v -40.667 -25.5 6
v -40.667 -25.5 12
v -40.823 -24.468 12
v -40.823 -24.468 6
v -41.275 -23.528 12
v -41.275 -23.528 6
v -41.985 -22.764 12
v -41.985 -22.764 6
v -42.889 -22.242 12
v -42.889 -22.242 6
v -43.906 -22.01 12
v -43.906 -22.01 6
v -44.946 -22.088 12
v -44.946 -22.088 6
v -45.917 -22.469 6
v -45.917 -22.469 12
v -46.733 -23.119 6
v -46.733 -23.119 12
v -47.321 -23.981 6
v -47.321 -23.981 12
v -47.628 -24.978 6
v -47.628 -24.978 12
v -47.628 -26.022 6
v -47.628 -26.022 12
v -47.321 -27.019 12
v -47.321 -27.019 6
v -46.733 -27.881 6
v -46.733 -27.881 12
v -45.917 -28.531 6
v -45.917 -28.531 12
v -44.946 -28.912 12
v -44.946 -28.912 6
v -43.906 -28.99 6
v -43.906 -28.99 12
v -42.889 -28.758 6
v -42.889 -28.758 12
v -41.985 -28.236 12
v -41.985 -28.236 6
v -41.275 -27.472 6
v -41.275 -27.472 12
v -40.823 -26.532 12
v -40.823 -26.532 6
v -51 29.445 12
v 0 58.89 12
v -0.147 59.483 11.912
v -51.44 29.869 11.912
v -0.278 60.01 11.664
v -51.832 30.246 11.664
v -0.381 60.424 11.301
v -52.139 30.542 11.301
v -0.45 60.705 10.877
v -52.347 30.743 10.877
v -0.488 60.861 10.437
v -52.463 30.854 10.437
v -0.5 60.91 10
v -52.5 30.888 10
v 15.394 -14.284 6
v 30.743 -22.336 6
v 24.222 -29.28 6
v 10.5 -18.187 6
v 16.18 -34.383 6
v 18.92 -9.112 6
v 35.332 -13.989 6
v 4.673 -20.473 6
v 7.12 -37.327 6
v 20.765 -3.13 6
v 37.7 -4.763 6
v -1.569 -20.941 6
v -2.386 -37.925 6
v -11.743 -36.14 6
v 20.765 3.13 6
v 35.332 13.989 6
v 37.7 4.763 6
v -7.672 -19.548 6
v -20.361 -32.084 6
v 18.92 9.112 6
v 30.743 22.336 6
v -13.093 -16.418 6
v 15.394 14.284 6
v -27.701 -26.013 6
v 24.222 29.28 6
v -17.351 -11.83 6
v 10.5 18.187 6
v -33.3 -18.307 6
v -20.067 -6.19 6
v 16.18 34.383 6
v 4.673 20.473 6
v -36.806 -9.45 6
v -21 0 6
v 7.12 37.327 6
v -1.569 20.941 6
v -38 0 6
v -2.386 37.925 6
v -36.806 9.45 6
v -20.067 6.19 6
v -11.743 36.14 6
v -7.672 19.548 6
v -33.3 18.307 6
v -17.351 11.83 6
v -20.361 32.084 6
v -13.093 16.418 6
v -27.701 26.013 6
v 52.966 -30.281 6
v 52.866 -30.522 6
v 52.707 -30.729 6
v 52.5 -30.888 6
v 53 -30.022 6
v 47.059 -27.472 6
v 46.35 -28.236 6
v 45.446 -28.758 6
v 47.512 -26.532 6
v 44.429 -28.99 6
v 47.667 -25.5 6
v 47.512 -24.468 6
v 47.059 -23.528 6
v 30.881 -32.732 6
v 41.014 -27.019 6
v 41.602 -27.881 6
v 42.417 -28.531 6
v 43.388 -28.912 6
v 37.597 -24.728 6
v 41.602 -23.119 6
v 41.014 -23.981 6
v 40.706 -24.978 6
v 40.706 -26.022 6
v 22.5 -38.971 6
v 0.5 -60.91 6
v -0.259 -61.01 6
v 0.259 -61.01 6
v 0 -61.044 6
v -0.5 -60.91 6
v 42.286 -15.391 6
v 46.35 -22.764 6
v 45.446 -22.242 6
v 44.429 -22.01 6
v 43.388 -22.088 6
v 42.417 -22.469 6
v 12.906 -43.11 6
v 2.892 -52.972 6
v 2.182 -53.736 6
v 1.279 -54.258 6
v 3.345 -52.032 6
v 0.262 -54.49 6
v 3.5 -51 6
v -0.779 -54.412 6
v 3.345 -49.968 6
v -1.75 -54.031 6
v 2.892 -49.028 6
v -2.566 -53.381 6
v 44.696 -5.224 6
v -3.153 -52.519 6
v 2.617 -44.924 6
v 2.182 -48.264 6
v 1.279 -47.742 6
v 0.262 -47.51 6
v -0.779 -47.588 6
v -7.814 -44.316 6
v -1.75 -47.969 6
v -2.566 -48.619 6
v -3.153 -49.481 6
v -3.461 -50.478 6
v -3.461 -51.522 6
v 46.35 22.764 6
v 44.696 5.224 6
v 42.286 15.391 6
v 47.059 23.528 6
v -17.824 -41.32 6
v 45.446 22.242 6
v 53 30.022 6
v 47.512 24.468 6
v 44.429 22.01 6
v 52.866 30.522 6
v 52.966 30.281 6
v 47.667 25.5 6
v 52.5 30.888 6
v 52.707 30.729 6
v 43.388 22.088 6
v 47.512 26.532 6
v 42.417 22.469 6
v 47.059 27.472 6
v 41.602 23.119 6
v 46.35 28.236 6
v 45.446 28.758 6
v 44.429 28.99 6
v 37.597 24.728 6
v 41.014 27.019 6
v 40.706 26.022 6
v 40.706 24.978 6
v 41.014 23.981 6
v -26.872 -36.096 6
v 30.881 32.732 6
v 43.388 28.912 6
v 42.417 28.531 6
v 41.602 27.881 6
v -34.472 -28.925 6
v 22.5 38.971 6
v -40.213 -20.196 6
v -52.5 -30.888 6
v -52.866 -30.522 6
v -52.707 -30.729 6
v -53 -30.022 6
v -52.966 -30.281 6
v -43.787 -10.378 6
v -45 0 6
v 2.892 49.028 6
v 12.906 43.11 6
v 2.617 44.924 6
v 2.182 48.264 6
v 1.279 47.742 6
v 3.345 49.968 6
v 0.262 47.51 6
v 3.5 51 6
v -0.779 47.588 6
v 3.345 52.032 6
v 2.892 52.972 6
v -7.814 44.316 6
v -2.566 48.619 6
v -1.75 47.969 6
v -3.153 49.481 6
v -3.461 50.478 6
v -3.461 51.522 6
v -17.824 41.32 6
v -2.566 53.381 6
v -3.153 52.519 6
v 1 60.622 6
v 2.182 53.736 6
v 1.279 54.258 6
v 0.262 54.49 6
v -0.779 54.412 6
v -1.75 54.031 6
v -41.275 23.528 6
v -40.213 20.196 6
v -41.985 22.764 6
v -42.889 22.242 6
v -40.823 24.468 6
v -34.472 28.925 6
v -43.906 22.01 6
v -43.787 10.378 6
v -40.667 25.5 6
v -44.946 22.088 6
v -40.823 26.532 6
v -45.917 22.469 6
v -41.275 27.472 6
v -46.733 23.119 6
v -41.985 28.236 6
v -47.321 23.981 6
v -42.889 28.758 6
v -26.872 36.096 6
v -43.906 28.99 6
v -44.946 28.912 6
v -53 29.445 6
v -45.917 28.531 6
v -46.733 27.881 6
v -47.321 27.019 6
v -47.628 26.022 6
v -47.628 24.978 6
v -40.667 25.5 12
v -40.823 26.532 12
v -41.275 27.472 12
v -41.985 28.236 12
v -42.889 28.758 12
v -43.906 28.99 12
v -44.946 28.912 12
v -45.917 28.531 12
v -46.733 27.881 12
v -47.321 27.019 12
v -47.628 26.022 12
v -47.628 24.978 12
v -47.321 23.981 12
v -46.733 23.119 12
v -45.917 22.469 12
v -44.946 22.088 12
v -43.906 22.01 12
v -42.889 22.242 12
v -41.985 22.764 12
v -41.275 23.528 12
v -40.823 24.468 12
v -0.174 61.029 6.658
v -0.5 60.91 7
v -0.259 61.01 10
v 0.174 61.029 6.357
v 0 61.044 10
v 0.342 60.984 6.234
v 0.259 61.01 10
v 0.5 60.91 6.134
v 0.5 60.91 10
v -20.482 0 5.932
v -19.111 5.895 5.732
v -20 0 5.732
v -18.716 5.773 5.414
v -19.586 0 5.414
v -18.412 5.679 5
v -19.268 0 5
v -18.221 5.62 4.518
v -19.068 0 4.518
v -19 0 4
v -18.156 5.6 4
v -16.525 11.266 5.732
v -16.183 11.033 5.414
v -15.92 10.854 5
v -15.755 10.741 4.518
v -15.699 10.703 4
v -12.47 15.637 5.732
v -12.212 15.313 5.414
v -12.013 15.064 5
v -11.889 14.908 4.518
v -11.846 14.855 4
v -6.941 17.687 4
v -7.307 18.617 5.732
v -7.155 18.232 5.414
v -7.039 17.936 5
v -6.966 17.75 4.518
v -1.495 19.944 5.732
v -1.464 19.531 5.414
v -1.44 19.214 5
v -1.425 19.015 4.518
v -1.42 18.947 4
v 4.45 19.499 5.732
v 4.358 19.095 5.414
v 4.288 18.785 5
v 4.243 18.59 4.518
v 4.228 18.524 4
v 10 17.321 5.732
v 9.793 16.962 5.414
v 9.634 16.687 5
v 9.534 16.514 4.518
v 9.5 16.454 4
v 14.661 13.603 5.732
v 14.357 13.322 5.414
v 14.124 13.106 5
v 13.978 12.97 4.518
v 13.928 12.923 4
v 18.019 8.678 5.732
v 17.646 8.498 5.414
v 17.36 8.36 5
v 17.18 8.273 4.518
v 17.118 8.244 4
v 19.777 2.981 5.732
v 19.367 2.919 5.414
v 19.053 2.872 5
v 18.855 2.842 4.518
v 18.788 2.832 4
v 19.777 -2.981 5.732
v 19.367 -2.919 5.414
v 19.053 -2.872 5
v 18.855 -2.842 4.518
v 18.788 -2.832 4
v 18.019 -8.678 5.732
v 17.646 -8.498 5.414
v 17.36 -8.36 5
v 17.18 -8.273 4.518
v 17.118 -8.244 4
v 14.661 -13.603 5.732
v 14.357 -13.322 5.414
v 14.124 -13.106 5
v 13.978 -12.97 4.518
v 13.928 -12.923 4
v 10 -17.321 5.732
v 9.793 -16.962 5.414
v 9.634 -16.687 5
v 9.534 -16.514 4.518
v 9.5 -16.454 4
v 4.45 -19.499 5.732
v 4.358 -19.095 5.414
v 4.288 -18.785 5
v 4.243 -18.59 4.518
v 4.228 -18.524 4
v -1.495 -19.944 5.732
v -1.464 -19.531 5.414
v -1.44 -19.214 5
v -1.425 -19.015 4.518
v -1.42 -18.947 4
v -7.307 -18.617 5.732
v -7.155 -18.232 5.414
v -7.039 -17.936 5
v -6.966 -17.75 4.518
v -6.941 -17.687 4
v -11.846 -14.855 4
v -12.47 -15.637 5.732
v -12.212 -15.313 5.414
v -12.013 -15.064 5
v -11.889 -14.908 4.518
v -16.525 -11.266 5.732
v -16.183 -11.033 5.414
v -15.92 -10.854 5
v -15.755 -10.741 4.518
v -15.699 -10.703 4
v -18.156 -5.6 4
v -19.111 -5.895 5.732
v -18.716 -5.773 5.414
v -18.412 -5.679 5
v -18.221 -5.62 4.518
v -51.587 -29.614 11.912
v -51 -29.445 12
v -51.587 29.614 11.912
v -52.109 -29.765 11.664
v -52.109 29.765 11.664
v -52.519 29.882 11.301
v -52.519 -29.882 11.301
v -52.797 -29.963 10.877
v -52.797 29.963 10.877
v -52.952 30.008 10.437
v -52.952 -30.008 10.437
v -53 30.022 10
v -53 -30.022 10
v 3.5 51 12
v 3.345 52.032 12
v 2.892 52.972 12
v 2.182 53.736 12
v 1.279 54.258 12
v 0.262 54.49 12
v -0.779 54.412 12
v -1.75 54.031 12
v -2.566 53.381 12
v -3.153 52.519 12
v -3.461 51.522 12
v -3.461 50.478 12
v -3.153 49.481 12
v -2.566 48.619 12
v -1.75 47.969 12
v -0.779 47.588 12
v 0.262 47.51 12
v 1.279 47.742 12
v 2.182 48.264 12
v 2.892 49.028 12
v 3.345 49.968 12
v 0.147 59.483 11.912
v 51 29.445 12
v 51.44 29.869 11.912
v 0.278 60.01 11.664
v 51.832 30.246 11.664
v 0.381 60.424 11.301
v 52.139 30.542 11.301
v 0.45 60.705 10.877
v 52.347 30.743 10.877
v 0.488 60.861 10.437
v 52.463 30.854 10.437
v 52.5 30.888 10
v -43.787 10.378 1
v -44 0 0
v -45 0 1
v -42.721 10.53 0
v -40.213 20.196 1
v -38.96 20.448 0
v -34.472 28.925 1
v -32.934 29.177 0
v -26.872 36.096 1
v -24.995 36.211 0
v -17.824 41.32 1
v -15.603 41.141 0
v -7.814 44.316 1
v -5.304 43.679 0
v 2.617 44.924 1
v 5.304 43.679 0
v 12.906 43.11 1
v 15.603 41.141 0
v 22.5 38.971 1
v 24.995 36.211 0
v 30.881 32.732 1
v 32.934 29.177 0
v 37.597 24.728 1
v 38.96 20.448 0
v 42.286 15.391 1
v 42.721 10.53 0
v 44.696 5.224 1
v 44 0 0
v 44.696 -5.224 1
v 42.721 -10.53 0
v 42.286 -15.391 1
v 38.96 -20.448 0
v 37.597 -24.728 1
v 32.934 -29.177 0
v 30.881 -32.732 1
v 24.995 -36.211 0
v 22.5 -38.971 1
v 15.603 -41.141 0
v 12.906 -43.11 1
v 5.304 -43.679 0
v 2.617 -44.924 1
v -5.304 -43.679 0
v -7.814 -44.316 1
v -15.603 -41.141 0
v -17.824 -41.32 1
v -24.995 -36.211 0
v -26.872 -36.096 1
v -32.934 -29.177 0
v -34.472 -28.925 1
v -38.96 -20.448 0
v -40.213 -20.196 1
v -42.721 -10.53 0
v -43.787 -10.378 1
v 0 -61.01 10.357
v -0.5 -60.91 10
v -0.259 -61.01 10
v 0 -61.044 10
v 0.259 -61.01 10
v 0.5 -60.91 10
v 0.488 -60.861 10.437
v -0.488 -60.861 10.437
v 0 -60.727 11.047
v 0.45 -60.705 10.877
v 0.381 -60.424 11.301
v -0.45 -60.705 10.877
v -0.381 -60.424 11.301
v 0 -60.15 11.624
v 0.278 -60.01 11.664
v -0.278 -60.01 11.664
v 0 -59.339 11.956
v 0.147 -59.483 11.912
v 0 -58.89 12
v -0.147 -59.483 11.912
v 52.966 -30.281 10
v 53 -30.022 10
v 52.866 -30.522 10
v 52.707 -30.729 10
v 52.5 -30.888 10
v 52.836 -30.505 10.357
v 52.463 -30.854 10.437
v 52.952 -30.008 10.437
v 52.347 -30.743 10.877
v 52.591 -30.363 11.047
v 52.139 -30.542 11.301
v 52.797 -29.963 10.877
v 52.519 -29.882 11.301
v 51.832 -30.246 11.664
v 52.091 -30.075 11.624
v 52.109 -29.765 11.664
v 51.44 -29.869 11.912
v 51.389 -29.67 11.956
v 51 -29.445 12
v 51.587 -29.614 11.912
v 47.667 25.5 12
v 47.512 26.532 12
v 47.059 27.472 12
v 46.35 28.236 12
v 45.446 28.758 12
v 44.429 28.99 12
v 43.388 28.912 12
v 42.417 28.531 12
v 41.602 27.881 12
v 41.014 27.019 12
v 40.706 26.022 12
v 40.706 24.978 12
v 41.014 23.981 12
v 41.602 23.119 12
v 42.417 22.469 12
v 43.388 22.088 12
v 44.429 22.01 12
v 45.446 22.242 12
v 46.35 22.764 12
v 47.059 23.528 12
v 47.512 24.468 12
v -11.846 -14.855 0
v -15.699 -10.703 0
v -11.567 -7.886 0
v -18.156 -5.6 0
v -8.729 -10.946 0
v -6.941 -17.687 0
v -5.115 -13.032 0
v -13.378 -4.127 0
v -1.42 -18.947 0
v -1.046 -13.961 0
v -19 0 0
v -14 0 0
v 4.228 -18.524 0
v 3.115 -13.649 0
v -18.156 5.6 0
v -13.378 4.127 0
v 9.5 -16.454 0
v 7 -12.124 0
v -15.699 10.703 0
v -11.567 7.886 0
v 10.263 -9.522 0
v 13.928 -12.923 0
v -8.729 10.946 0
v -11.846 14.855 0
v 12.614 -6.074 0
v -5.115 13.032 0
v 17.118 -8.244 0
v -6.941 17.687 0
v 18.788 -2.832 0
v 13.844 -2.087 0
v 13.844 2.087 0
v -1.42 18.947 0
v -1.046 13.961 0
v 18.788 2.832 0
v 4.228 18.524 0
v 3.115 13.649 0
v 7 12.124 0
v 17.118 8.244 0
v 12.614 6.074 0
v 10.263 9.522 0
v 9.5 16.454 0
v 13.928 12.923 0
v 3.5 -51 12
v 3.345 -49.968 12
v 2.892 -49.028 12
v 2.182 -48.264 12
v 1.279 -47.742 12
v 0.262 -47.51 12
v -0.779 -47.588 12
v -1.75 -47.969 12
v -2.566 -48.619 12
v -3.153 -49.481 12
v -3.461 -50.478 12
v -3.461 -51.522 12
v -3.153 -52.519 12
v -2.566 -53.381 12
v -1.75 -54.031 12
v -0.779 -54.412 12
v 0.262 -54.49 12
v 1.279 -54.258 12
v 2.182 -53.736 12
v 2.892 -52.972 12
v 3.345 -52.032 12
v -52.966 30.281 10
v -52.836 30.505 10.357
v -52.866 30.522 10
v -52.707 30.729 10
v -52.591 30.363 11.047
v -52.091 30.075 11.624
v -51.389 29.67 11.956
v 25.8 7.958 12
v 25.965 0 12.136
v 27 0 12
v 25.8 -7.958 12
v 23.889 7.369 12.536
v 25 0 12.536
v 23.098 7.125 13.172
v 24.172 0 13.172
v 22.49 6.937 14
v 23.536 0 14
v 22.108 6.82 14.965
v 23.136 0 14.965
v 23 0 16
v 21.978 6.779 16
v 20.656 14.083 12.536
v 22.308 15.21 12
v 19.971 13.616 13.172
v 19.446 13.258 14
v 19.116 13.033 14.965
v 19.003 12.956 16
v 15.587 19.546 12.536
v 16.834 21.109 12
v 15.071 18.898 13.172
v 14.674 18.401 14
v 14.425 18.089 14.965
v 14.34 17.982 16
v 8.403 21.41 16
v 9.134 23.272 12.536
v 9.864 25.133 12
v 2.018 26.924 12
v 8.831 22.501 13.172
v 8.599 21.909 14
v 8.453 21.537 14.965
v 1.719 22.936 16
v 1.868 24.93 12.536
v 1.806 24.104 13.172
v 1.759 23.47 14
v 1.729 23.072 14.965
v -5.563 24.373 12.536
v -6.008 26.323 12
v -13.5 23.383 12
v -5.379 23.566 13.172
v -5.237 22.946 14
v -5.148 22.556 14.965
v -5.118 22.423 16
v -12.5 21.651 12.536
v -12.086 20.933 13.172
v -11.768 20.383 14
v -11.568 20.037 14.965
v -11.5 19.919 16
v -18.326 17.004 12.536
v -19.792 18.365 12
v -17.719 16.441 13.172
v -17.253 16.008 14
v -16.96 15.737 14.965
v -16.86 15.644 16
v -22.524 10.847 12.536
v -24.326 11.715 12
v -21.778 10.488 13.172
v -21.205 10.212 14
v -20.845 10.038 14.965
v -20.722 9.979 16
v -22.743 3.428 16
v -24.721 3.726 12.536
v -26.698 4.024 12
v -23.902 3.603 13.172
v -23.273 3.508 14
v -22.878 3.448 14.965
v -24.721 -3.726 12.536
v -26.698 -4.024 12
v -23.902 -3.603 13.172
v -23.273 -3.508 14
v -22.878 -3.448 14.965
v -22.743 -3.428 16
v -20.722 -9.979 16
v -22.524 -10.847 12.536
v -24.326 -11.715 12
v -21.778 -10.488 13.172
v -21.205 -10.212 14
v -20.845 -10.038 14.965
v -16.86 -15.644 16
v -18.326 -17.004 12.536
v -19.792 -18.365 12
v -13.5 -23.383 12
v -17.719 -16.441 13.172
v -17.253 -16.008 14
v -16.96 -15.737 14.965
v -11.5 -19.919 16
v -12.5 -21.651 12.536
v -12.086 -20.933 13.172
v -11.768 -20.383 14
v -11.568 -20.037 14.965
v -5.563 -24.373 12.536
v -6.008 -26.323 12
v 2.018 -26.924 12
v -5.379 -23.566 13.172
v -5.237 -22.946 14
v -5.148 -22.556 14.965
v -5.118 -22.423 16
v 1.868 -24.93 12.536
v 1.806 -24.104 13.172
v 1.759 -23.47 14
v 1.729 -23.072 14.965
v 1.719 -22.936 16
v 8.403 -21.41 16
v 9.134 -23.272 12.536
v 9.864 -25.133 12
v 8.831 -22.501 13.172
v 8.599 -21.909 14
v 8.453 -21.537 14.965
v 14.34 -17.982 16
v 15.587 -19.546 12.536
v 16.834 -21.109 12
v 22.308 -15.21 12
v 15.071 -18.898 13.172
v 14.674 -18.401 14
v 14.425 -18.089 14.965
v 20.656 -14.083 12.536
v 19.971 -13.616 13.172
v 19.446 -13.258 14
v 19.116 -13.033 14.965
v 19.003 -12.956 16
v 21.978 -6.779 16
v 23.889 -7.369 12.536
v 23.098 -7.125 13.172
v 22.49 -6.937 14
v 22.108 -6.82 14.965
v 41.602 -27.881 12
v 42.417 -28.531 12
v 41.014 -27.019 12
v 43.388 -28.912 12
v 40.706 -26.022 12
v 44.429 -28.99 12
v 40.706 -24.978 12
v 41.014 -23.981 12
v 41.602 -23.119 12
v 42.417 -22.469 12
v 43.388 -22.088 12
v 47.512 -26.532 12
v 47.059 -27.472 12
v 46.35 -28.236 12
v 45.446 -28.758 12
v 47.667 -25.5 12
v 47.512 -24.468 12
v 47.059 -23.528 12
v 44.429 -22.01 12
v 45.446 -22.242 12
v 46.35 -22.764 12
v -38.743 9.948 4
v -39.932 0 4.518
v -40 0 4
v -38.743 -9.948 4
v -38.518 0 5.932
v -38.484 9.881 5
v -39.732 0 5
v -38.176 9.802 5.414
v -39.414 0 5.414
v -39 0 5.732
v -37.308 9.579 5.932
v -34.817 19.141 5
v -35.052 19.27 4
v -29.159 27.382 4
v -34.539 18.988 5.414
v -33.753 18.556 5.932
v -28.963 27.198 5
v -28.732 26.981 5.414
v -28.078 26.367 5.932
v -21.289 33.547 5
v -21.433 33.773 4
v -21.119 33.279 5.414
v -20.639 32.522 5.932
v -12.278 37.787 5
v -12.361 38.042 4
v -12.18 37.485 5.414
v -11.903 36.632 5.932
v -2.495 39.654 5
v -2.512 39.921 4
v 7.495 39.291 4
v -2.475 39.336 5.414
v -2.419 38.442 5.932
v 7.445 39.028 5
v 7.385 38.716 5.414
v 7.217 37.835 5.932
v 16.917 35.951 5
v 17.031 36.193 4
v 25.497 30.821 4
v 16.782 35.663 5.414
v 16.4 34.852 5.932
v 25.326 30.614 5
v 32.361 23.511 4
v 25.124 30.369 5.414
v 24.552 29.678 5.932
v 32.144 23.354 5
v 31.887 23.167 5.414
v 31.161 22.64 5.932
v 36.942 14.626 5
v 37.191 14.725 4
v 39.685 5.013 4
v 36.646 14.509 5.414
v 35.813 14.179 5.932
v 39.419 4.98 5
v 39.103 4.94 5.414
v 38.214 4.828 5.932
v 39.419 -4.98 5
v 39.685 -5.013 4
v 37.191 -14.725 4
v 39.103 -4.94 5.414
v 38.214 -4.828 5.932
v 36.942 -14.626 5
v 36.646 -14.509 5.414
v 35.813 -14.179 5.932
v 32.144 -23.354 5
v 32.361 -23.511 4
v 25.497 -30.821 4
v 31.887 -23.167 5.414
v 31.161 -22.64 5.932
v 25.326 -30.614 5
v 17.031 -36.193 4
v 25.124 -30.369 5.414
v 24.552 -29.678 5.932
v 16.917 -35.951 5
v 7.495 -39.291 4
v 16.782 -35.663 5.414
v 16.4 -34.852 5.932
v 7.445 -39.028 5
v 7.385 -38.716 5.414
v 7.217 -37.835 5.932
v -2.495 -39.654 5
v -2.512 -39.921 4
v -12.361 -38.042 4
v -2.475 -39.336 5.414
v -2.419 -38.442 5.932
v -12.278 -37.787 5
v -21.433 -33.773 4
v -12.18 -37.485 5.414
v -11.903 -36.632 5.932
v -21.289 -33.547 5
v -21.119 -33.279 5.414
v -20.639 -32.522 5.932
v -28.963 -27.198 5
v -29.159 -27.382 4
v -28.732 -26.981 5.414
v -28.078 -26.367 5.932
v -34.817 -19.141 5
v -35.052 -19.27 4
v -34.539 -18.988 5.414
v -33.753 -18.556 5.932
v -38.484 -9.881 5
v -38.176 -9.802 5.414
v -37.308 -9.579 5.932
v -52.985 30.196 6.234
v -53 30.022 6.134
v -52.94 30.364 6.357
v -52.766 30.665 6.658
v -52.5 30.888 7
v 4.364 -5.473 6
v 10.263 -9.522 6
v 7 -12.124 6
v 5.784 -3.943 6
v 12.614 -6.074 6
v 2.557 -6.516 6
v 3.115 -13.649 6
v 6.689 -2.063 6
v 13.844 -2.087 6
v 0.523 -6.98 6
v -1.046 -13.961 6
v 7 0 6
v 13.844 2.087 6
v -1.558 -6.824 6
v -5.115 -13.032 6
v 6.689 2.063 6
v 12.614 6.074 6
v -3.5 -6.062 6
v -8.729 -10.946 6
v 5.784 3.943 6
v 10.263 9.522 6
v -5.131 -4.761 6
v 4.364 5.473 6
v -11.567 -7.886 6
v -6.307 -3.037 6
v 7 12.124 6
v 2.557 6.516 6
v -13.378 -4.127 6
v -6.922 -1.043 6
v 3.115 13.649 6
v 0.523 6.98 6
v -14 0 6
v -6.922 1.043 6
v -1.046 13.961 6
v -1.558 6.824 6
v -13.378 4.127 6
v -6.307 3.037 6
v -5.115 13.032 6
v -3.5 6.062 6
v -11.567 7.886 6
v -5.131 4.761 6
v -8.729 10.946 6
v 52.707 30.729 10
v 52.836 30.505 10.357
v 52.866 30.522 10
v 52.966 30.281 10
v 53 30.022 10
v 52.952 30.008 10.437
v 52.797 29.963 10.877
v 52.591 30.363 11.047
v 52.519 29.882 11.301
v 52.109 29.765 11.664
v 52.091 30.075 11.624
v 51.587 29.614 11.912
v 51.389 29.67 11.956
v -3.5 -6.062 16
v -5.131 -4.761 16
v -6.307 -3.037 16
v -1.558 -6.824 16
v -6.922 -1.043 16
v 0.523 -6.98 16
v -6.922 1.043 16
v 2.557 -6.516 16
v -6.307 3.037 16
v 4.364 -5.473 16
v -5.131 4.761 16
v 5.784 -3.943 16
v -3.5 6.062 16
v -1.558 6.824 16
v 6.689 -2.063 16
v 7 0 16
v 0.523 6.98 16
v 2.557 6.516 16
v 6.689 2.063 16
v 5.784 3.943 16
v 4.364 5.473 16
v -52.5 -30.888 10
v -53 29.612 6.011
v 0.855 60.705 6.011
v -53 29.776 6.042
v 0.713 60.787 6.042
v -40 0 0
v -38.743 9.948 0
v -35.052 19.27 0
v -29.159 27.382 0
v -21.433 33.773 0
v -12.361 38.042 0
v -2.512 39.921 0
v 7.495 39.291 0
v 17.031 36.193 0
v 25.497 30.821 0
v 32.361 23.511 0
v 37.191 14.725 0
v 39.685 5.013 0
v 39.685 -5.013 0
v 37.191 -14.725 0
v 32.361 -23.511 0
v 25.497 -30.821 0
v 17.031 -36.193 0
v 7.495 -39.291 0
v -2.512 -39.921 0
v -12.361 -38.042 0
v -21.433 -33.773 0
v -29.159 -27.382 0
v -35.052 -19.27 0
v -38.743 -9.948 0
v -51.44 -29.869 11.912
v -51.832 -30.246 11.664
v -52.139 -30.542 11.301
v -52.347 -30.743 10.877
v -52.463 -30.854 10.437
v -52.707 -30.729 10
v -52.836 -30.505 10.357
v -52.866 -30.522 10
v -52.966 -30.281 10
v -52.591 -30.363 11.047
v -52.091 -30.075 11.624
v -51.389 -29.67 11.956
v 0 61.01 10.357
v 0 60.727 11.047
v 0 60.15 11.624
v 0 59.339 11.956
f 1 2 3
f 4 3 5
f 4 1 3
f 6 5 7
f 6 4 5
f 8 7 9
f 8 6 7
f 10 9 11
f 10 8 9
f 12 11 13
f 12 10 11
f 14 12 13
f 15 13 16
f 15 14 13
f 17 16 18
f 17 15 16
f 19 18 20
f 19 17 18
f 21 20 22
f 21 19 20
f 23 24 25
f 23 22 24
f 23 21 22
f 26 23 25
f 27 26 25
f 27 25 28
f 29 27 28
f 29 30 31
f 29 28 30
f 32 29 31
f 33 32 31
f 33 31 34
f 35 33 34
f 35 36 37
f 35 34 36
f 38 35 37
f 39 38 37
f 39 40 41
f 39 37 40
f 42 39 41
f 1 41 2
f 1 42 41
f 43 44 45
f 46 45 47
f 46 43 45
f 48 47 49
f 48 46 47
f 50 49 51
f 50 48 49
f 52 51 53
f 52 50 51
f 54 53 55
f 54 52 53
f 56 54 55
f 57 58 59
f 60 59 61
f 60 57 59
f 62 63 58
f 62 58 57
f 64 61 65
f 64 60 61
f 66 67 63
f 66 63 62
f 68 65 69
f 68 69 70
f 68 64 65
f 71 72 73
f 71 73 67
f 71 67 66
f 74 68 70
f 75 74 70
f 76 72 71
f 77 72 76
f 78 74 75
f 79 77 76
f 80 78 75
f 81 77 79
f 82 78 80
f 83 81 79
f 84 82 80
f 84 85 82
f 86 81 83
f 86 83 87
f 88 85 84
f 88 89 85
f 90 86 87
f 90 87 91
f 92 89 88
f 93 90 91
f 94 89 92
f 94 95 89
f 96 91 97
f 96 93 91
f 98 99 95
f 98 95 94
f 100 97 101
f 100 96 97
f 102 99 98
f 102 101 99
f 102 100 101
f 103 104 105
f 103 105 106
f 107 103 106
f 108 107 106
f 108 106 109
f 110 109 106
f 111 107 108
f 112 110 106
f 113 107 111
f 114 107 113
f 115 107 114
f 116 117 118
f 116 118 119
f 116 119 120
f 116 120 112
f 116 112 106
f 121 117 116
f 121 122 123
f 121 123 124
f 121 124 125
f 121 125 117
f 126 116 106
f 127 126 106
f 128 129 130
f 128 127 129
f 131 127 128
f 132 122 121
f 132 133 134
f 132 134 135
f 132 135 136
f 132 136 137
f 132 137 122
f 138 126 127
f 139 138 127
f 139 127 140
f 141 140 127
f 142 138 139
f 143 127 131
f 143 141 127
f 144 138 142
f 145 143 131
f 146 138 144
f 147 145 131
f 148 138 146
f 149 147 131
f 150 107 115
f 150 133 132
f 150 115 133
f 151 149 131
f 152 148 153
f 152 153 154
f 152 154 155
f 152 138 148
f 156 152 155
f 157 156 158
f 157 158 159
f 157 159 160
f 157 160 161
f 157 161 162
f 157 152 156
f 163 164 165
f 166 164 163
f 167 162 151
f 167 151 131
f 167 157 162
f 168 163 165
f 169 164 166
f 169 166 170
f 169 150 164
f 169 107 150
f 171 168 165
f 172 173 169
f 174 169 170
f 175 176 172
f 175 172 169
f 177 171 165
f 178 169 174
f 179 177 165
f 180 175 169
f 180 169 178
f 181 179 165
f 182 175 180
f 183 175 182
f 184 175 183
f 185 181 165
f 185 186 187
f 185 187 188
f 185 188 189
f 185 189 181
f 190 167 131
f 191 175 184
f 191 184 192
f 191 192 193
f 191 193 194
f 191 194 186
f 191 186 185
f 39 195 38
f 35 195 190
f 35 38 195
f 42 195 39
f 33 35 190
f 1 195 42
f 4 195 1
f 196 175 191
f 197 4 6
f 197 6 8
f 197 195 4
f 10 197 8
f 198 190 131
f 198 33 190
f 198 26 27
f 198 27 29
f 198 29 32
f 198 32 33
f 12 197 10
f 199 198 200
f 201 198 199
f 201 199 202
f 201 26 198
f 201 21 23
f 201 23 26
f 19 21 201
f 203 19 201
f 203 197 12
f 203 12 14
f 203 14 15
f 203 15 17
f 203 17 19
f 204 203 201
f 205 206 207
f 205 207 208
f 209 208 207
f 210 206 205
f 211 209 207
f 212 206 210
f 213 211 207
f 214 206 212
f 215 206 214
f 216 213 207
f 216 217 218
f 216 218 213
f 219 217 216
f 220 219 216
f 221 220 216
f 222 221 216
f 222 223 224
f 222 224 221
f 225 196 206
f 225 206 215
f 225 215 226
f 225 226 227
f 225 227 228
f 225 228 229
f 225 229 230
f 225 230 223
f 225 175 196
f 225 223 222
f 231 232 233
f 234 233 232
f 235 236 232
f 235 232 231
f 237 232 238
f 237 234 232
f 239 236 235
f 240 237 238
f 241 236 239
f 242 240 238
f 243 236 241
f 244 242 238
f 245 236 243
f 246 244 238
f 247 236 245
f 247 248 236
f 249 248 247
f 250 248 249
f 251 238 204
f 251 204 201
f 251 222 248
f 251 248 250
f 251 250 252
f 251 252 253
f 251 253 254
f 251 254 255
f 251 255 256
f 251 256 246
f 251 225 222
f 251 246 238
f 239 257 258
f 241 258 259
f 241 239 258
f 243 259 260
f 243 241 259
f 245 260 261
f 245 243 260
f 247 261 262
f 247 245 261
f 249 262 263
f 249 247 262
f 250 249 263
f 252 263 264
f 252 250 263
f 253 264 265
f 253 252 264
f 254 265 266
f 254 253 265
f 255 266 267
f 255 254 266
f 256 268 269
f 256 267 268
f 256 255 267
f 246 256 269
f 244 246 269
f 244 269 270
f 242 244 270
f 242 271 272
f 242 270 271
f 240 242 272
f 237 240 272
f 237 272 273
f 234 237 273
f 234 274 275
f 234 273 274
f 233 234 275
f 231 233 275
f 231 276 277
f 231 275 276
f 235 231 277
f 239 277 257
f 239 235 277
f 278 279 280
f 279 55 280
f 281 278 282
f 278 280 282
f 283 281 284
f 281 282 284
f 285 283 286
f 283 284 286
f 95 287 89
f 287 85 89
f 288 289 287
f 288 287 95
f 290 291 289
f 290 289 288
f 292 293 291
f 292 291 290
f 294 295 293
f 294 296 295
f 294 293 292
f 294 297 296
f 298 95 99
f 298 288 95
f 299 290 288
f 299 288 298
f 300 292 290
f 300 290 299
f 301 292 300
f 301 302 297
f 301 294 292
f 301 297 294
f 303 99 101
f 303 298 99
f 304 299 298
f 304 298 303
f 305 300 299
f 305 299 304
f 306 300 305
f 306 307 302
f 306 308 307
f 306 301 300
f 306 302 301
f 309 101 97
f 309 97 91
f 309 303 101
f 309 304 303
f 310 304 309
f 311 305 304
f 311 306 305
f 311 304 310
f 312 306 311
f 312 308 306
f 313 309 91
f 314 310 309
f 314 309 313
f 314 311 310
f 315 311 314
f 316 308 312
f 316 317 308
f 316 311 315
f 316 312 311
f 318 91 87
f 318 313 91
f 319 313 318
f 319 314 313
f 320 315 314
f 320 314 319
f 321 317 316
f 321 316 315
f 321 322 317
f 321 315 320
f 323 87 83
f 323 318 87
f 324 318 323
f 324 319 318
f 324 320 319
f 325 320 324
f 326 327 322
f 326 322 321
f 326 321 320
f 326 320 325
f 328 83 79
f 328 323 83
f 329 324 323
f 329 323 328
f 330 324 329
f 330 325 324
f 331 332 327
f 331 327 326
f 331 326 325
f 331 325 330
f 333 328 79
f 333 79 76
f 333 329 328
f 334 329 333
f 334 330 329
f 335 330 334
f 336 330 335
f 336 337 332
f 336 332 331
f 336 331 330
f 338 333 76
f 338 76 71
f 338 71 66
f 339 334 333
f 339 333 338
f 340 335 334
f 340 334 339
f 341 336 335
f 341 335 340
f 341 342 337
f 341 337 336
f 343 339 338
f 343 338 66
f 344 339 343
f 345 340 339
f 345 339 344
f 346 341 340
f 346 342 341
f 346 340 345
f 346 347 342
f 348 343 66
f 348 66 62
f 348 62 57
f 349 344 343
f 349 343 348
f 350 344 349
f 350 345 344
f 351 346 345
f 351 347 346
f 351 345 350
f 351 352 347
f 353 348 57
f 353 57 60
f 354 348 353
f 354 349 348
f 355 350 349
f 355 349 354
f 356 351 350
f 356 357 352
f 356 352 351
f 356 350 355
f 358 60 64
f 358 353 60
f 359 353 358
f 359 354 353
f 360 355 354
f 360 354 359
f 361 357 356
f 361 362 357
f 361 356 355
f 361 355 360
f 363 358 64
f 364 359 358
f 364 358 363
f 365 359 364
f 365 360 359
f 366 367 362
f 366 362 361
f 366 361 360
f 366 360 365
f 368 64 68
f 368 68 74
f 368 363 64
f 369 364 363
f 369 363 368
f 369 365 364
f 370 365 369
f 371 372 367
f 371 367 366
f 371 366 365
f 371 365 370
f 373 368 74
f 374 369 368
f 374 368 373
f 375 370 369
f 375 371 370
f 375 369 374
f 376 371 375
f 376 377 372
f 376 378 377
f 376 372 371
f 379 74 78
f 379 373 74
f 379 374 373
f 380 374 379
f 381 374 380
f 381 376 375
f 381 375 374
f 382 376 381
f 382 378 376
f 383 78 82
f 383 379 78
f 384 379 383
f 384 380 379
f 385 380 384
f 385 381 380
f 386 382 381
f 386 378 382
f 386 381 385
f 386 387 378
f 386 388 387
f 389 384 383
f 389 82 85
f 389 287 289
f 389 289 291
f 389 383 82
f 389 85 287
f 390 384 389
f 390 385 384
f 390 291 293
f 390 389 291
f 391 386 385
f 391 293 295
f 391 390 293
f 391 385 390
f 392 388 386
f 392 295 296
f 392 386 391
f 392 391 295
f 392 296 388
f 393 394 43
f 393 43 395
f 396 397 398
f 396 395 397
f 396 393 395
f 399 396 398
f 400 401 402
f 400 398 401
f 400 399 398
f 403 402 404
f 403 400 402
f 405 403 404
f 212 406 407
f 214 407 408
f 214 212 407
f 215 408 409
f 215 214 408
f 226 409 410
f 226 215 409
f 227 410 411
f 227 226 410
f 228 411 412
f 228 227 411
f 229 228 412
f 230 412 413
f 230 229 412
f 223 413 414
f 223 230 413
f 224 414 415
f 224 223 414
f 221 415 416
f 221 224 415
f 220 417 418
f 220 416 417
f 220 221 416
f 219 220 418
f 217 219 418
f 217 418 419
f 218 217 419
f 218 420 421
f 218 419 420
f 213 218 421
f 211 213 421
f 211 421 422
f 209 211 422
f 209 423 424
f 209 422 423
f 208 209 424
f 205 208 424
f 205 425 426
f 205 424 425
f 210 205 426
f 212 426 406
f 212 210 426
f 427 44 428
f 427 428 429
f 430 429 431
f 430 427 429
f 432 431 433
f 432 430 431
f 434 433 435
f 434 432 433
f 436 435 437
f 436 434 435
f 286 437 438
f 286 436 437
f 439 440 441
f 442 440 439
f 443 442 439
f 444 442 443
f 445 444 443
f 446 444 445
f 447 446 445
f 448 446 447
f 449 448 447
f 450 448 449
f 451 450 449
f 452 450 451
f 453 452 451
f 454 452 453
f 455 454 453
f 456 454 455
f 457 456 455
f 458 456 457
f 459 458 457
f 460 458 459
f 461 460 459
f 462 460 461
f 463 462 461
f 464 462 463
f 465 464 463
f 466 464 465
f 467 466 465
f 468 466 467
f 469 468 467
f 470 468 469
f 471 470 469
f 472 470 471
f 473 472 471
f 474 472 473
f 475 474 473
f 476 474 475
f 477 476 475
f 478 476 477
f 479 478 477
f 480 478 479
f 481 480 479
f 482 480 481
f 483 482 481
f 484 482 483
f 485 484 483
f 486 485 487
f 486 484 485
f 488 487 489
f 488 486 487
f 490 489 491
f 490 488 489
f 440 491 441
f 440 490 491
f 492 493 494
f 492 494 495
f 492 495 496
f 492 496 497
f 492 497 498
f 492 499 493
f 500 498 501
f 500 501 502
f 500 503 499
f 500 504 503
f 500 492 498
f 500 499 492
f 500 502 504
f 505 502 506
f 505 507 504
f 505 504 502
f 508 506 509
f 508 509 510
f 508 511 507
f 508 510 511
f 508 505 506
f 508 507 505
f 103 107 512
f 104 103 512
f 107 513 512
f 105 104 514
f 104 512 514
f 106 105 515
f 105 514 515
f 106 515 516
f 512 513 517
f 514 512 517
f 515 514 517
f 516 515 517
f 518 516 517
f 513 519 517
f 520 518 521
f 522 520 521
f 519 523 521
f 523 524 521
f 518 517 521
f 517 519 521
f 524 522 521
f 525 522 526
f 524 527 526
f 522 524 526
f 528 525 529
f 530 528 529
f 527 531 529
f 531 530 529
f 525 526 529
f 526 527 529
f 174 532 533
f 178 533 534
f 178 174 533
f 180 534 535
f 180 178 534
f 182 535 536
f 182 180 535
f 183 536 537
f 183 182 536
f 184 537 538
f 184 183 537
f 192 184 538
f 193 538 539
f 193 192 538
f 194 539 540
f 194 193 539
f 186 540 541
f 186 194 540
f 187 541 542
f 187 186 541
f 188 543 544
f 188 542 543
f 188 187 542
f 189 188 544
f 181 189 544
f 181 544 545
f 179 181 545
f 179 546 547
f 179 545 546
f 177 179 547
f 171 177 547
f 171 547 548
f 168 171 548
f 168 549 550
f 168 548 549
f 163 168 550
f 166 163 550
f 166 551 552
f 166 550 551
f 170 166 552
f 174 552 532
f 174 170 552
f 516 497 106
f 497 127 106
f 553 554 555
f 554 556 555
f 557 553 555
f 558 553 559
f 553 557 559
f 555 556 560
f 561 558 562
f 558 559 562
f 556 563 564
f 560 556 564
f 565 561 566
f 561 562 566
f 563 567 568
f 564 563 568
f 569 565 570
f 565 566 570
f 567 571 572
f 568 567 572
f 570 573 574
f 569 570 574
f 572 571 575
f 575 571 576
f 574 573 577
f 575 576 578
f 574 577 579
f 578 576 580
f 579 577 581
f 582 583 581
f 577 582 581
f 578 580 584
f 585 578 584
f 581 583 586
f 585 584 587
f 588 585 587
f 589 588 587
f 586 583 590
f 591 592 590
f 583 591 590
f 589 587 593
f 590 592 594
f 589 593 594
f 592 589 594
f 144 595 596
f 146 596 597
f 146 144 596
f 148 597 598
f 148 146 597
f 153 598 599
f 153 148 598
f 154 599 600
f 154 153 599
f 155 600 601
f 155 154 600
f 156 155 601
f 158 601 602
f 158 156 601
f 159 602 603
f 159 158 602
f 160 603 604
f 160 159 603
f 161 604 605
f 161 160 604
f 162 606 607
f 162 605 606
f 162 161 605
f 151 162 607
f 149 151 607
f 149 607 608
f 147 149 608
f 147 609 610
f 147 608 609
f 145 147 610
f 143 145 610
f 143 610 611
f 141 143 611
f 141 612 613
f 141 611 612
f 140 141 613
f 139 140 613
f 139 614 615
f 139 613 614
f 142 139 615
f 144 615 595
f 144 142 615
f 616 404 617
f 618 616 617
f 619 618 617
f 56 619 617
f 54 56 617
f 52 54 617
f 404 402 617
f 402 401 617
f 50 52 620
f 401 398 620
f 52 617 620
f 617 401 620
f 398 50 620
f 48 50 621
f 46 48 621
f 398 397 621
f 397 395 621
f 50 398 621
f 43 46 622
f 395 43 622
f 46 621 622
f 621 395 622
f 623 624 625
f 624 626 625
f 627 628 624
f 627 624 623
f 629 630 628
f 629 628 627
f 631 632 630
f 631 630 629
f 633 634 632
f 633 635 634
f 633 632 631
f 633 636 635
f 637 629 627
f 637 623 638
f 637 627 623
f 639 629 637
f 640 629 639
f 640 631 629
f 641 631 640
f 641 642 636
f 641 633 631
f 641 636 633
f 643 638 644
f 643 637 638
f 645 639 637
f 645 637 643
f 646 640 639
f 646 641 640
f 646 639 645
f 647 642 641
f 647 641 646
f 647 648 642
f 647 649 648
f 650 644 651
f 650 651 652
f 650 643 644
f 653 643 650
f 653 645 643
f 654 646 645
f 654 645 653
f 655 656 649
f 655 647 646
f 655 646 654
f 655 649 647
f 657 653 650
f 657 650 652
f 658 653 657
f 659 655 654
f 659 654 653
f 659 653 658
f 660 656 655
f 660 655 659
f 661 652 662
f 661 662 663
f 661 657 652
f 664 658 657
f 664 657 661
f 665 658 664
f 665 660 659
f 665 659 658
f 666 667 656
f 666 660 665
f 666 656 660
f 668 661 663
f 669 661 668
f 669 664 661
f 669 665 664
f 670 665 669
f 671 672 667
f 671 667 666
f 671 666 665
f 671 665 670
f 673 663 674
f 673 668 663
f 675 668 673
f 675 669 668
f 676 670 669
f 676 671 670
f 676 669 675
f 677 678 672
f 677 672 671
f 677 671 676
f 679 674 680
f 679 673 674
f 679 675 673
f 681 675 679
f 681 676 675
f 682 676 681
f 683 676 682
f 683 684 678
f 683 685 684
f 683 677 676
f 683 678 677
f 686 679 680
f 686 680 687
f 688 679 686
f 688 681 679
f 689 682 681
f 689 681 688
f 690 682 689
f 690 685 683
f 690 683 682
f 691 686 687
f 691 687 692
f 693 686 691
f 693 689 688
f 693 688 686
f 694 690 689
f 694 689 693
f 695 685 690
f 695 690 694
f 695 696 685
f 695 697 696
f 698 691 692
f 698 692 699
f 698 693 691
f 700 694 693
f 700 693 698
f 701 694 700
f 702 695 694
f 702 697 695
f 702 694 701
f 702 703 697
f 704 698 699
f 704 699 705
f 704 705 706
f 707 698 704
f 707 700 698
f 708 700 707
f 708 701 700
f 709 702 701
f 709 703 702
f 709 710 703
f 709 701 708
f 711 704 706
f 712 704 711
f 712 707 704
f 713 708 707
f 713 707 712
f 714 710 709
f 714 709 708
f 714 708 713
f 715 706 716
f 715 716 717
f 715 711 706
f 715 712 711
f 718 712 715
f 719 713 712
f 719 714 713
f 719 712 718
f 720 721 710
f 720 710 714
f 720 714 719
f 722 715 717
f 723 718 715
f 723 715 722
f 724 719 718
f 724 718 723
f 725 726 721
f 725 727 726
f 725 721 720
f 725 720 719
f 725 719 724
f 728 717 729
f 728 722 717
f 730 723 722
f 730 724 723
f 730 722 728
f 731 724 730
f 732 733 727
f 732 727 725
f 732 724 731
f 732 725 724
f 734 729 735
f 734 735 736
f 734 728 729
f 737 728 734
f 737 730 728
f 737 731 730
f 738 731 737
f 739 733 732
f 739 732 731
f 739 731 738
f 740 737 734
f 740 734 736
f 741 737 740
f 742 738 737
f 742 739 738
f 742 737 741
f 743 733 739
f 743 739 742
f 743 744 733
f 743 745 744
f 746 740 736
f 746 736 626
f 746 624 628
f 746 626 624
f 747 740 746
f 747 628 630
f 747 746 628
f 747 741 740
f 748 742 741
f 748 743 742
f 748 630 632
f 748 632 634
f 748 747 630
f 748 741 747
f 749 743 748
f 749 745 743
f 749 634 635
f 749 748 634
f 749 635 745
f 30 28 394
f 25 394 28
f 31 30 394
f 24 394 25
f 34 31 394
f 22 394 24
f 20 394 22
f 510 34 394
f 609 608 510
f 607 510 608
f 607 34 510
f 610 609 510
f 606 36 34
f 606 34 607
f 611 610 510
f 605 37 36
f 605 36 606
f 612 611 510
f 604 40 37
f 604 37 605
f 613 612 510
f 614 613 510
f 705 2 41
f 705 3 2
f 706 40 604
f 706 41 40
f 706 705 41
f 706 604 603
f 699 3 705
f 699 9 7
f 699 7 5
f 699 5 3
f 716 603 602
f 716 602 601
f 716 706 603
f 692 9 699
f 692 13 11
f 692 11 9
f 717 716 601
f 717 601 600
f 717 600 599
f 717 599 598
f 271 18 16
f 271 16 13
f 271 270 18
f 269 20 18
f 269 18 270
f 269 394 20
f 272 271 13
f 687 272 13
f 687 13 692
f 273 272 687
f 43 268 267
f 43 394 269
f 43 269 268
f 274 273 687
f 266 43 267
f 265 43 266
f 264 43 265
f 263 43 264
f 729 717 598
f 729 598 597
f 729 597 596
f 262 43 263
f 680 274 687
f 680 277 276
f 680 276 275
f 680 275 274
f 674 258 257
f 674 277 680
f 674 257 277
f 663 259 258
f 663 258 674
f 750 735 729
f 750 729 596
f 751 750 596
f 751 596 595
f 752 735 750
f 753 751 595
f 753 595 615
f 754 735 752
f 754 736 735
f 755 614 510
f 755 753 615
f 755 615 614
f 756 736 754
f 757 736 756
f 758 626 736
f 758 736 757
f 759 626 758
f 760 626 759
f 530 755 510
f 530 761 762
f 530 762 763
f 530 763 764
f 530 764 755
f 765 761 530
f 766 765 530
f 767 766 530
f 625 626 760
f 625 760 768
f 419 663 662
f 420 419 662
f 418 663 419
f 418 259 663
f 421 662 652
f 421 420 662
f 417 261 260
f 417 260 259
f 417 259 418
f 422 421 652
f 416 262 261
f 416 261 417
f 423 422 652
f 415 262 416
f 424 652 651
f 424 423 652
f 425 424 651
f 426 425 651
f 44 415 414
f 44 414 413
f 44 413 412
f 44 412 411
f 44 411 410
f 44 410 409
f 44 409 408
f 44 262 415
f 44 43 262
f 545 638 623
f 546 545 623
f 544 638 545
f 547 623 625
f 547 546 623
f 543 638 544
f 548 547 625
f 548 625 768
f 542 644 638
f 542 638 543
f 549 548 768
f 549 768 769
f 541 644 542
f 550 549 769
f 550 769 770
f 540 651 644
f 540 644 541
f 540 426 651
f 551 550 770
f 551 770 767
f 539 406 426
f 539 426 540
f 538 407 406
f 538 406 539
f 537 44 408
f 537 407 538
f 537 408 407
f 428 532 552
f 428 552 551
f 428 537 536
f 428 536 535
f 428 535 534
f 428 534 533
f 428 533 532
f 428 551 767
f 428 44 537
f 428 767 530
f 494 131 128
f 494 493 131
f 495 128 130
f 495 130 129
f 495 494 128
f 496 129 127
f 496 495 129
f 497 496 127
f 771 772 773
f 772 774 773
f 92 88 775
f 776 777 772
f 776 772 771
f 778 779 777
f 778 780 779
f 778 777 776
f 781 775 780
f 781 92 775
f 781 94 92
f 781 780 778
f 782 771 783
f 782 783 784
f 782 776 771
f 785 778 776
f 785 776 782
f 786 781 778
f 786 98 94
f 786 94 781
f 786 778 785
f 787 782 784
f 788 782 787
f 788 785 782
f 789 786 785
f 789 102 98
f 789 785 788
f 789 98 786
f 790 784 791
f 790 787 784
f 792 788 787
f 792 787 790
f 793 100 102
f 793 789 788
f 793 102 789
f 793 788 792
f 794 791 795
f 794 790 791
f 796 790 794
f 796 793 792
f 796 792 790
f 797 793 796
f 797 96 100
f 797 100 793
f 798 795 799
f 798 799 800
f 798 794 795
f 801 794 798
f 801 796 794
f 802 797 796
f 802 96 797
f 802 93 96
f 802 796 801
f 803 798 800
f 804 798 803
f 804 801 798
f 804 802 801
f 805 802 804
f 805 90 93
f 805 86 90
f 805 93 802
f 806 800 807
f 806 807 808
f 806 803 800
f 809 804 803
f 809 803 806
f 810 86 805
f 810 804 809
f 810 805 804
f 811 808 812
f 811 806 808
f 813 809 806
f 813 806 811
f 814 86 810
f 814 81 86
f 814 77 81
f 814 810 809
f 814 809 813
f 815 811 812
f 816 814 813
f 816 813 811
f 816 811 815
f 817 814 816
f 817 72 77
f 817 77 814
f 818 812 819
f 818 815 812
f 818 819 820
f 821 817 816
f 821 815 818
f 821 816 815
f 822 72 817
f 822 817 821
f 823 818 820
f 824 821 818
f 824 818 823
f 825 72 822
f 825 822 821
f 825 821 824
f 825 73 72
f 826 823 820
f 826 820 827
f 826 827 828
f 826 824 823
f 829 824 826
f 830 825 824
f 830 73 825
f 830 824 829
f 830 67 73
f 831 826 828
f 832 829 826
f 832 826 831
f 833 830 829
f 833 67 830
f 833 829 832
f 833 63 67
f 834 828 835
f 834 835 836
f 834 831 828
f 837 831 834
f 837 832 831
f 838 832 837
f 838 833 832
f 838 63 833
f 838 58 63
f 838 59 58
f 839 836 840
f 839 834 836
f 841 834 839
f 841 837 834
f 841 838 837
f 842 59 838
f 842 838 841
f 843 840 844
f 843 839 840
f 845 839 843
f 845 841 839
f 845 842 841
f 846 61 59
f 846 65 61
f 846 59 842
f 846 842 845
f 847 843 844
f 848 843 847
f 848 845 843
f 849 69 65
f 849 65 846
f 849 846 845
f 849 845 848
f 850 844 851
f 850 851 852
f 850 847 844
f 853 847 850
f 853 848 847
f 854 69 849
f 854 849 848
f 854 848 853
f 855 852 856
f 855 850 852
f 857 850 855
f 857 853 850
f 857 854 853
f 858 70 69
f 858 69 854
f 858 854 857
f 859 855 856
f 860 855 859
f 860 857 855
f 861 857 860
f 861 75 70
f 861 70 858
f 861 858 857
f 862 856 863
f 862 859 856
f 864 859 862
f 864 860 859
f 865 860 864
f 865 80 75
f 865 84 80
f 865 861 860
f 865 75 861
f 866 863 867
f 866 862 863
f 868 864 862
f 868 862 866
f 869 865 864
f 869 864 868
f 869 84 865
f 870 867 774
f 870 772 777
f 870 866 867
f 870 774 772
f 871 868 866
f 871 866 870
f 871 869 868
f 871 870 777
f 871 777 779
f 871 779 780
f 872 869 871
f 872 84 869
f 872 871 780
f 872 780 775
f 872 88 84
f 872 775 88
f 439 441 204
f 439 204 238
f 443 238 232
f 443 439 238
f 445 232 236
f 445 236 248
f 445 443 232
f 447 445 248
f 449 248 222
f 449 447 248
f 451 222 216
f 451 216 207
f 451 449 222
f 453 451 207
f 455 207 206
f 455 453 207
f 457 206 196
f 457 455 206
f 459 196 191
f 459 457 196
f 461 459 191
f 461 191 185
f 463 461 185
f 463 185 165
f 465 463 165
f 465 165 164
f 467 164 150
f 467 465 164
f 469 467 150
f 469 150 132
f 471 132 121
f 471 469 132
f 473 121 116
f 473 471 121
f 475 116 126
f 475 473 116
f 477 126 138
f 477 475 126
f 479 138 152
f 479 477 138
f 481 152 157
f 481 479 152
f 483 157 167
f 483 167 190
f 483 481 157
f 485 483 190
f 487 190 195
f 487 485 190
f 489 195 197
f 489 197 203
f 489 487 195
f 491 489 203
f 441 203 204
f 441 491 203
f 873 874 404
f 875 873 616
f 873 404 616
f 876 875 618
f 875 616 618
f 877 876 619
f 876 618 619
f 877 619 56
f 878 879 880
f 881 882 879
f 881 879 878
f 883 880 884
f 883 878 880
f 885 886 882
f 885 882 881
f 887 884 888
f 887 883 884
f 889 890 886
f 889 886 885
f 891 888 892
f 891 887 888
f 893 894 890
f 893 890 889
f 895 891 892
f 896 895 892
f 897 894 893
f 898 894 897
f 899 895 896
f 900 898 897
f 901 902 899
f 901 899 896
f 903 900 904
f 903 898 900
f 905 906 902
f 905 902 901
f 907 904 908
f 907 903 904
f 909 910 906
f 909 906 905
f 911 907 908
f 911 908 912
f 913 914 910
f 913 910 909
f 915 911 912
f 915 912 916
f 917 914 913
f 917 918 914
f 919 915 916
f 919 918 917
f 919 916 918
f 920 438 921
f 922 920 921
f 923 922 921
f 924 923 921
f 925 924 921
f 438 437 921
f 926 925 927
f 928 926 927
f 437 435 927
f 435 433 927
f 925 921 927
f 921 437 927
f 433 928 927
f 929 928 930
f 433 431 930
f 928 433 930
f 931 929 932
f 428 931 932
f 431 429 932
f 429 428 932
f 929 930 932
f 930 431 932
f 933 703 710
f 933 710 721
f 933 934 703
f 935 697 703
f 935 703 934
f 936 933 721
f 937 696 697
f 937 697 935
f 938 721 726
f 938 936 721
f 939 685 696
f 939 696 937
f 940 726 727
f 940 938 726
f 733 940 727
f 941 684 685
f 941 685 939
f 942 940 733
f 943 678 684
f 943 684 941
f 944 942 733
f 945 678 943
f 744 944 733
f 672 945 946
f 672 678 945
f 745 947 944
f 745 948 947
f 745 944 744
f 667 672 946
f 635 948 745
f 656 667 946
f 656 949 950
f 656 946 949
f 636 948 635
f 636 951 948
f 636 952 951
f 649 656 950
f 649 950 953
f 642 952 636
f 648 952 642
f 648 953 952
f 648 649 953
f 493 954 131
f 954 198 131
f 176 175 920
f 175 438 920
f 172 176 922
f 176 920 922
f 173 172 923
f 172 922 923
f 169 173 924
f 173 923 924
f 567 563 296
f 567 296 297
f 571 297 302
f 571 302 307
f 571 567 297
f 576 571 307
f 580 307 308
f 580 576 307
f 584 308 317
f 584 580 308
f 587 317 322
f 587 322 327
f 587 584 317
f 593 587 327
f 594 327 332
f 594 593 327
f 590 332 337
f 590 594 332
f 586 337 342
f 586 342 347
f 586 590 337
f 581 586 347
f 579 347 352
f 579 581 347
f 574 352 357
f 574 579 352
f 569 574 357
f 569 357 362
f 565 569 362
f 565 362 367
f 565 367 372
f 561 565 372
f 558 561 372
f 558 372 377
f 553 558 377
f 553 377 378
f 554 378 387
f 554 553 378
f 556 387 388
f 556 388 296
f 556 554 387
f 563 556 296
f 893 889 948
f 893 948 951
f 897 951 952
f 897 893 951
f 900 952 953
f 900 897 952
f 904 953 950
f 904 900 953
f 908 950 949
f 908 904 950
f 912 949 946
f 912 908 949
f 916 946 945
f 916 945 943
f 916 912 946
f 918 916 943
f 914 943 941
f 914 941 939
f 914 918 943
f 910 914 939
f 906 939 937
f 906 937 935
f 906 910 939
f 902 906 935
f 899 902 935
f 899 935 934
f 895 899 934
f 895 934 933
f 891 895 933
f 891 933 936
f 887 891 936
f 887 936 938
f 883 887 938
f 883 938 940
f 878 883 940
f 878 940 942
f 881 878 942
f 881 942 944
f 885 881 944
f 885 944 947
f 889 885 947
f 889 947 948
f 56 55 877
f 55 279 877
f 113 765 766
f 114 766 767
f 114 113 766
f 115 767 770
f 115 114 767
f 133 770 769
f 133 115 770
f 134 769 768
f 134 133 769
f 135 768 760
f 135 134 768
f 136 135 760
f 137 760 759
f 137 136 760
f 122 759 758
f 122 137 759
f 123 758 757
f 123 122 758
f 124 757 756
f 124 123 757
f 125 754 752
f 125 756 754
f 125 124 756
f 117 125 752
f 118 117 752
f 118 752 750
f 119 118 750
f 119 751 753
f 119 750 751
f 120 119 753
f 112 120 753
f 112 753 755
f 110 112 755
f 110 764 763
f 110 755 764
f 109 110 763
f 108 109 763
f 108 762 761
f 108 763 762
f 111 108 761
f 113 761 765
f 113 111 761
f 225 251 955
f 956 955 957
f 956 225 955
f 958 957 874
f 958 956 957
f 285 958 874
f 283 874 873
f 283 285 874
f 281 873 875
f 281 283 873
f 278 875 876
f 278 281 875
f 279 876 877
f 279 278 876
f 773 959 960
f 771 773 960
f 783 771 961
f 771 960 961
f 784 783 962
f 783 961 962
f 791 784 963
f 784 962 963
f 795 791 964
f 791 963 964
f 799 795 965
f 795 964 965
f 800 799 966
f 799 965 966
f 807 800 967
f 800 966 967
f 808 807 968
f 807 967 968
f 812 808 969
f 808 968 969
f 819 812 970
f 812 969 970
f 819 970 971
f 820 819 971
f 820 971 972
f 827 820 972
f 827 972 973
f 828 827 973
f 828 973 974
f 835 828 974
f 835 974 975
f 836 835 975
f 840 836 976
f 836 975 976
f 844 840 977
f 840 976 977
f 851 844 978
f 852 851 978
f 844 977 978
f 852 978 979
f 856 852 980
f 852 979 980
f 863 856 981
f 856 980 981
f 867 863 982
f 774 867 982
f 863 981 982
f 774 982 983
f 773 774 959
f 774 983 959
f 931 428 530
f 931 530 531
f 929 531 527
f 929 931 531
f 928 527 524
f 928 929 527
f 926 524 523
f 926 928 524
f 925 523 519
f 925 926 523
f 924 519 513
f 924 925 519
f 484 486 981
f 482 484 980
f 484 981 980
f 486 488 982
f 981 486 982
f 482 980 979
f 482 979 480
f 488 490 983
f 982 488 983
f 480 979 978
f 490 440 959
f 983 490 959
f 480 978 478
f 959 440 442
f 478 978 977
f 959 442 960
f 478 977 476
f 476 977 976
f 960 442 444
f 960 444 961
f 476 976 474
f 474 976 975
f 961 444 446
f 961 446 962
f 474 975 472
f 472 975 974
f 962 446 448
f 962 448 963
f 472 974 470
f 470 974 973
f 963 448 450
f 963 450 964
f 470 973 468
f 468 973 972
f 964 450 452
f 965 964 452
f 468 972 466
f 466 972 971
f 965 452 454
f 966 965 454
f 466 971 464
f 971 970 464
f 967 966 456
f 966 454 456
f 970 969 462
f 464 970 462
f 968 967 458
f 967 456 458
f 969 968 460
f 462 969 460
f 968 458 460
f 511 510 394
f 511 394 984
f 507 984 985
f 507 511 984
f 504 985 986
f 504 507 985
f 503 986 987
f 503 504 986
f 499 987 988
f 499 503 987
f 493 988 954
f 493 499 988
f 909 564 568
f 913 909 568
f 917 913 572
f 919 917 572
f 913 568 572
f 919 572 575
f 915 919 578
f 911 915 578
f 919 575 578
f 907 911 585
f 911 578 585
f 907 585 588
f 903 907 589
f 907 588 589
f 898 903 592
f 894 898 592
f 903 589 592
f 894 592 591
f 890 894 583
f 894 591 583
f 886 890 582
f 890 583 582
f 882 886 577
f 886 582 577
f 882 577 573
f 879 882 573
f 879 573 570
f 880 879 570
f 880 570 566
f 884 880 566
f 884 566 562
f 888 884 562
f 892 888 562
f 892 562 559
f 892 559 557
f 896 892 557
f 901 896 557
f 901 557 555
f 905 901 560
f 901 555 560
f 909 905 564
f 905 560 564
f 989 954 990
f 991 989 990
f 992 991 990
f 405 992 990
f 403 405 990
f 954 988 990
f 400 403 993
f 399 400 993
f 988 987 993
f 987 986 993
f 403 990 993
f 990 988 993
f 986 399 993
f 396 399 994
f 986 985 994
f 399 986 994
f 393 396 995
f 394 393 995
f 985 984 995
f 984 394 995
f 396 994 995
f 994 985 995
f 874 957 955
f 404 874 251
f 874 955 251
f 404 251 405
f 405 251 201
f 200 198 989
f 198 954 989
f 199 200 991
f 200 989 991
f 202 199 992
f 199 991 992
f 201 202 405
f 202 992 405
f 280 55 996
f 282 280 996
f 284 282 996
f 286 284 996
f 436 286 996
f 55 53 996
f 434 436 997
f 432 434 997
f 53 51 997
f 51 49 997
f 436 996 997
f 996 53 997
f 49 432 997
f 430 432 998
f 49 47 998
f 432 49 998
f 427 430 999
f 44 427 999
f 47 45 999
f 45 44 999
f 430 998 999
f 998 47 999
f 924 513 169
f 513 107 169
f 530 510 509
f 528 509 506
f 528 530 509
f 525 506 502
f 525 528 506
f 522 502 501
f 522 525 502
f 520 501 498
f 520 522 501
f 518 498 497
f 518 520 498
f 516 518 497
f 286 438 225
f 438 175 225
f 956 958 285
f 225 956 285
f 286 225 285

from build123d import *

# Parameters (mm, degrees)
SKETCH1_R           = 3.5
SKETCH1_R_2         = 7
BOSS_EXTRUDE1_DEPTH = 16
SKETCH3_R           = 23
CUT_EXTRUDE1_DEPTH  = 4
SKETCH4_R           = 45
SKETCH4_R_2         = 3.5
SKETCH4_R_3         = 40
SKETCH4_R_4         = 19
SKETCH4_R_5         = 14
SKETCH4_R_6         = 7
CUT_EXTRUDE2_DEPTH  = 6
FILLET1_R           = 4
FILLET2_R           = 2
CHAMFER1_SIZE       = 1
FILLET4_R           = 1


with BuildPart() as part:
    # Sketch1 → Boss-Extrude1 (new body)
    with BuildSketch(Plane.XY):
        Polygon((-53, -30.599564267), (0, -61.199128534), (53, -30.599564267), (53, 30.599564267), (0, 61.199128534), (-53, 30.599564267), align=None)
        with Locations((0, 51)):
            Circle(SKETCH1_R, mode=Mode.SUBTRACT)
        with Locations((44.167295593, 25.5)):
            Circle(SKETCH1_R, mode=Mode.SUBTRACT)
        with Locations((44.167295593, -25.5)):
            Circle(SKETCH1_R, mode=Mode.SUBTRACT)
        with Locations((0, -51)):
            Circle(SKETCH1_R, mode=Mode.SUBTRACT)
        with Locations((-44.167295593, -25.5)):
            Circle(SKETCH1_R, mode=Mode.SUBTRACT)
        with Locations((-44.167295593, 25.5)):
            Circle(SKETCH1_R, mode=Mode.SUBTRACT)
        Circle(SKETCH1_R_2, mode=Mode.SUBTRACT)
    extrude(amount=BOSS_EXTRUDE1_DEPTH)

    # Sketch3 → Cut-Extrude1 (cut)
    with BuildSketch(Plane.XY.offset(16)):
        Polygon((-53, 30.599564267), (-53, -30.599564267), (0, -61.199128534), (53, -30.599564267), (53, 30.599564267), (0, 61.199128534), align=None)
        Circle(SKETCH3_R, mode=Mode.SUBTRACT)
    extrude(amount=-CUT_EXTRUDE1_DEPTH, mode=Mode.SUBTRACT)

    # Sketch4 → Cut-Extrude2 (cut)
    # profile 1 of 3: a face of its own
    with BuildSketch(Plane(origin=(0, 0, 0), x_dir=(-1, 0, 0), z_dir=(0, 0, -1))):
        Polygon((0, -61.199128534), (53, -30.599564267), (53, 30.599564267), (0, 61.199128534), (-53, 30.599564267), (-53, -30.599564267), align=None)
        Circle(SKETCH4_R, mode=Mode.SUBTRACT)
        with Locations((0, 51)):
            Circle(SKETCH4_R_2, mode=Mode.SUBTRACT)
        with Locations((-44.167295593, 25.5)):
            Circle(SKETCH4_R_2, mode=Mode.SUBTRACT)
        with Locations((0, -51)):
            Circle(SKETCH4_R_2, mode=Mode.SUBTRACT)
        with Locations((44.167295593, 25.5)):
            Circle(SKETCH4_R_2, mode=Mode.SUBTRACT)
        with Locations((44.167295593, -25.5)):
            Circle(SKETCH4_R_2, mode=Mode.SUBTRACT)
        with Locations((-44.167295593, -25.5)):
            Circle(SKETCH4_R_2, mode=Mode.SUBTRACT)
    # profile 2 of 3: a face of its own
    with BuildSketch(Plane(origin=(0, 0, 0), x_dir=(-1, 0, 0), z_dir=(0, 0, -1))):
        Circle(SKETCH4_R_3)
        Circle(SKETCH4_R_4, mode=Mode.SUBTRACT)
    # profile 3 of 3: a face of its own
    with BuildSketch(Plane(origin=(0, 0, 0), x_dir=(-1, 0, 0), z_dir=(0, 0, -1))):
        Circle(SKETCH4_R_5)
        Circle(SKETCH4_R_6, mode=Mode.SUBTRACT)
    extrude(amount=-CUT_EXTRUDE2_DEPTH, mode=Mode.SUBTRACT)

    # Fillet1
    fillet1_edges = [part.edges().sort_by_distance(p)[0] for p in [
        (-23, 0, 12),
    ]]
    fillet(fillet1_edges, radius=FILLET1_R - 0.0001)  # a hair under: the kernel refuses the full size

    # Fillet2
    fillet2_edges = [part.edges().sort_by_distance(p)[0] for p in [
        (19, 0, 6),
        (-26.5, 45.899346401, 12),
        (26.5, 45.899346401, 12),
        (53, 0, 12),
        (26.5, -45.899346401, 12),
        (-26.5, -45.899346401, 12),
        (-53, 0, 12),
        (40, 0, 6),
    ]]
    fillet(fillet2_edges, radius=FILLET2_R)

    # Chamfer1
    chamfer1_edges = [part.edges().sort_by_distance(p)[0] for p in [
        (45, 0, 0),
    ]]
    chamfer(chamfer1_edges, length=CHAMFER1_SIZE)

    # Fillet4
    fillet4_edges = [part.edges().sort_by_distance(p)[0] for p in [
        (-26.5, 45.899346401, 6),
        (-53, 30.599564267, 8),
        (0, 61.199128534, 8),
        (-53, -30.599564267, 8),
        (0, -61.199128534, 8),
        (53, -30.599564267, 8),
        (53, 30.599564267, 8),
        (52.362858156, -30.231710252, 11.463768304),
        (0, -60.463420503, 11.463768304),
        (52.362858156, 30.231710252, 11.463768304),
        (-52.362858156, -30.231710252, 11.463768304),
        (0, 60.463420503, 11.463768304),
        (-52.362858156, 30.231710252, 11.463768304),
    ]]
    fillet(fillet4_edges, radius=FILLET4_R)


solid = part.part
